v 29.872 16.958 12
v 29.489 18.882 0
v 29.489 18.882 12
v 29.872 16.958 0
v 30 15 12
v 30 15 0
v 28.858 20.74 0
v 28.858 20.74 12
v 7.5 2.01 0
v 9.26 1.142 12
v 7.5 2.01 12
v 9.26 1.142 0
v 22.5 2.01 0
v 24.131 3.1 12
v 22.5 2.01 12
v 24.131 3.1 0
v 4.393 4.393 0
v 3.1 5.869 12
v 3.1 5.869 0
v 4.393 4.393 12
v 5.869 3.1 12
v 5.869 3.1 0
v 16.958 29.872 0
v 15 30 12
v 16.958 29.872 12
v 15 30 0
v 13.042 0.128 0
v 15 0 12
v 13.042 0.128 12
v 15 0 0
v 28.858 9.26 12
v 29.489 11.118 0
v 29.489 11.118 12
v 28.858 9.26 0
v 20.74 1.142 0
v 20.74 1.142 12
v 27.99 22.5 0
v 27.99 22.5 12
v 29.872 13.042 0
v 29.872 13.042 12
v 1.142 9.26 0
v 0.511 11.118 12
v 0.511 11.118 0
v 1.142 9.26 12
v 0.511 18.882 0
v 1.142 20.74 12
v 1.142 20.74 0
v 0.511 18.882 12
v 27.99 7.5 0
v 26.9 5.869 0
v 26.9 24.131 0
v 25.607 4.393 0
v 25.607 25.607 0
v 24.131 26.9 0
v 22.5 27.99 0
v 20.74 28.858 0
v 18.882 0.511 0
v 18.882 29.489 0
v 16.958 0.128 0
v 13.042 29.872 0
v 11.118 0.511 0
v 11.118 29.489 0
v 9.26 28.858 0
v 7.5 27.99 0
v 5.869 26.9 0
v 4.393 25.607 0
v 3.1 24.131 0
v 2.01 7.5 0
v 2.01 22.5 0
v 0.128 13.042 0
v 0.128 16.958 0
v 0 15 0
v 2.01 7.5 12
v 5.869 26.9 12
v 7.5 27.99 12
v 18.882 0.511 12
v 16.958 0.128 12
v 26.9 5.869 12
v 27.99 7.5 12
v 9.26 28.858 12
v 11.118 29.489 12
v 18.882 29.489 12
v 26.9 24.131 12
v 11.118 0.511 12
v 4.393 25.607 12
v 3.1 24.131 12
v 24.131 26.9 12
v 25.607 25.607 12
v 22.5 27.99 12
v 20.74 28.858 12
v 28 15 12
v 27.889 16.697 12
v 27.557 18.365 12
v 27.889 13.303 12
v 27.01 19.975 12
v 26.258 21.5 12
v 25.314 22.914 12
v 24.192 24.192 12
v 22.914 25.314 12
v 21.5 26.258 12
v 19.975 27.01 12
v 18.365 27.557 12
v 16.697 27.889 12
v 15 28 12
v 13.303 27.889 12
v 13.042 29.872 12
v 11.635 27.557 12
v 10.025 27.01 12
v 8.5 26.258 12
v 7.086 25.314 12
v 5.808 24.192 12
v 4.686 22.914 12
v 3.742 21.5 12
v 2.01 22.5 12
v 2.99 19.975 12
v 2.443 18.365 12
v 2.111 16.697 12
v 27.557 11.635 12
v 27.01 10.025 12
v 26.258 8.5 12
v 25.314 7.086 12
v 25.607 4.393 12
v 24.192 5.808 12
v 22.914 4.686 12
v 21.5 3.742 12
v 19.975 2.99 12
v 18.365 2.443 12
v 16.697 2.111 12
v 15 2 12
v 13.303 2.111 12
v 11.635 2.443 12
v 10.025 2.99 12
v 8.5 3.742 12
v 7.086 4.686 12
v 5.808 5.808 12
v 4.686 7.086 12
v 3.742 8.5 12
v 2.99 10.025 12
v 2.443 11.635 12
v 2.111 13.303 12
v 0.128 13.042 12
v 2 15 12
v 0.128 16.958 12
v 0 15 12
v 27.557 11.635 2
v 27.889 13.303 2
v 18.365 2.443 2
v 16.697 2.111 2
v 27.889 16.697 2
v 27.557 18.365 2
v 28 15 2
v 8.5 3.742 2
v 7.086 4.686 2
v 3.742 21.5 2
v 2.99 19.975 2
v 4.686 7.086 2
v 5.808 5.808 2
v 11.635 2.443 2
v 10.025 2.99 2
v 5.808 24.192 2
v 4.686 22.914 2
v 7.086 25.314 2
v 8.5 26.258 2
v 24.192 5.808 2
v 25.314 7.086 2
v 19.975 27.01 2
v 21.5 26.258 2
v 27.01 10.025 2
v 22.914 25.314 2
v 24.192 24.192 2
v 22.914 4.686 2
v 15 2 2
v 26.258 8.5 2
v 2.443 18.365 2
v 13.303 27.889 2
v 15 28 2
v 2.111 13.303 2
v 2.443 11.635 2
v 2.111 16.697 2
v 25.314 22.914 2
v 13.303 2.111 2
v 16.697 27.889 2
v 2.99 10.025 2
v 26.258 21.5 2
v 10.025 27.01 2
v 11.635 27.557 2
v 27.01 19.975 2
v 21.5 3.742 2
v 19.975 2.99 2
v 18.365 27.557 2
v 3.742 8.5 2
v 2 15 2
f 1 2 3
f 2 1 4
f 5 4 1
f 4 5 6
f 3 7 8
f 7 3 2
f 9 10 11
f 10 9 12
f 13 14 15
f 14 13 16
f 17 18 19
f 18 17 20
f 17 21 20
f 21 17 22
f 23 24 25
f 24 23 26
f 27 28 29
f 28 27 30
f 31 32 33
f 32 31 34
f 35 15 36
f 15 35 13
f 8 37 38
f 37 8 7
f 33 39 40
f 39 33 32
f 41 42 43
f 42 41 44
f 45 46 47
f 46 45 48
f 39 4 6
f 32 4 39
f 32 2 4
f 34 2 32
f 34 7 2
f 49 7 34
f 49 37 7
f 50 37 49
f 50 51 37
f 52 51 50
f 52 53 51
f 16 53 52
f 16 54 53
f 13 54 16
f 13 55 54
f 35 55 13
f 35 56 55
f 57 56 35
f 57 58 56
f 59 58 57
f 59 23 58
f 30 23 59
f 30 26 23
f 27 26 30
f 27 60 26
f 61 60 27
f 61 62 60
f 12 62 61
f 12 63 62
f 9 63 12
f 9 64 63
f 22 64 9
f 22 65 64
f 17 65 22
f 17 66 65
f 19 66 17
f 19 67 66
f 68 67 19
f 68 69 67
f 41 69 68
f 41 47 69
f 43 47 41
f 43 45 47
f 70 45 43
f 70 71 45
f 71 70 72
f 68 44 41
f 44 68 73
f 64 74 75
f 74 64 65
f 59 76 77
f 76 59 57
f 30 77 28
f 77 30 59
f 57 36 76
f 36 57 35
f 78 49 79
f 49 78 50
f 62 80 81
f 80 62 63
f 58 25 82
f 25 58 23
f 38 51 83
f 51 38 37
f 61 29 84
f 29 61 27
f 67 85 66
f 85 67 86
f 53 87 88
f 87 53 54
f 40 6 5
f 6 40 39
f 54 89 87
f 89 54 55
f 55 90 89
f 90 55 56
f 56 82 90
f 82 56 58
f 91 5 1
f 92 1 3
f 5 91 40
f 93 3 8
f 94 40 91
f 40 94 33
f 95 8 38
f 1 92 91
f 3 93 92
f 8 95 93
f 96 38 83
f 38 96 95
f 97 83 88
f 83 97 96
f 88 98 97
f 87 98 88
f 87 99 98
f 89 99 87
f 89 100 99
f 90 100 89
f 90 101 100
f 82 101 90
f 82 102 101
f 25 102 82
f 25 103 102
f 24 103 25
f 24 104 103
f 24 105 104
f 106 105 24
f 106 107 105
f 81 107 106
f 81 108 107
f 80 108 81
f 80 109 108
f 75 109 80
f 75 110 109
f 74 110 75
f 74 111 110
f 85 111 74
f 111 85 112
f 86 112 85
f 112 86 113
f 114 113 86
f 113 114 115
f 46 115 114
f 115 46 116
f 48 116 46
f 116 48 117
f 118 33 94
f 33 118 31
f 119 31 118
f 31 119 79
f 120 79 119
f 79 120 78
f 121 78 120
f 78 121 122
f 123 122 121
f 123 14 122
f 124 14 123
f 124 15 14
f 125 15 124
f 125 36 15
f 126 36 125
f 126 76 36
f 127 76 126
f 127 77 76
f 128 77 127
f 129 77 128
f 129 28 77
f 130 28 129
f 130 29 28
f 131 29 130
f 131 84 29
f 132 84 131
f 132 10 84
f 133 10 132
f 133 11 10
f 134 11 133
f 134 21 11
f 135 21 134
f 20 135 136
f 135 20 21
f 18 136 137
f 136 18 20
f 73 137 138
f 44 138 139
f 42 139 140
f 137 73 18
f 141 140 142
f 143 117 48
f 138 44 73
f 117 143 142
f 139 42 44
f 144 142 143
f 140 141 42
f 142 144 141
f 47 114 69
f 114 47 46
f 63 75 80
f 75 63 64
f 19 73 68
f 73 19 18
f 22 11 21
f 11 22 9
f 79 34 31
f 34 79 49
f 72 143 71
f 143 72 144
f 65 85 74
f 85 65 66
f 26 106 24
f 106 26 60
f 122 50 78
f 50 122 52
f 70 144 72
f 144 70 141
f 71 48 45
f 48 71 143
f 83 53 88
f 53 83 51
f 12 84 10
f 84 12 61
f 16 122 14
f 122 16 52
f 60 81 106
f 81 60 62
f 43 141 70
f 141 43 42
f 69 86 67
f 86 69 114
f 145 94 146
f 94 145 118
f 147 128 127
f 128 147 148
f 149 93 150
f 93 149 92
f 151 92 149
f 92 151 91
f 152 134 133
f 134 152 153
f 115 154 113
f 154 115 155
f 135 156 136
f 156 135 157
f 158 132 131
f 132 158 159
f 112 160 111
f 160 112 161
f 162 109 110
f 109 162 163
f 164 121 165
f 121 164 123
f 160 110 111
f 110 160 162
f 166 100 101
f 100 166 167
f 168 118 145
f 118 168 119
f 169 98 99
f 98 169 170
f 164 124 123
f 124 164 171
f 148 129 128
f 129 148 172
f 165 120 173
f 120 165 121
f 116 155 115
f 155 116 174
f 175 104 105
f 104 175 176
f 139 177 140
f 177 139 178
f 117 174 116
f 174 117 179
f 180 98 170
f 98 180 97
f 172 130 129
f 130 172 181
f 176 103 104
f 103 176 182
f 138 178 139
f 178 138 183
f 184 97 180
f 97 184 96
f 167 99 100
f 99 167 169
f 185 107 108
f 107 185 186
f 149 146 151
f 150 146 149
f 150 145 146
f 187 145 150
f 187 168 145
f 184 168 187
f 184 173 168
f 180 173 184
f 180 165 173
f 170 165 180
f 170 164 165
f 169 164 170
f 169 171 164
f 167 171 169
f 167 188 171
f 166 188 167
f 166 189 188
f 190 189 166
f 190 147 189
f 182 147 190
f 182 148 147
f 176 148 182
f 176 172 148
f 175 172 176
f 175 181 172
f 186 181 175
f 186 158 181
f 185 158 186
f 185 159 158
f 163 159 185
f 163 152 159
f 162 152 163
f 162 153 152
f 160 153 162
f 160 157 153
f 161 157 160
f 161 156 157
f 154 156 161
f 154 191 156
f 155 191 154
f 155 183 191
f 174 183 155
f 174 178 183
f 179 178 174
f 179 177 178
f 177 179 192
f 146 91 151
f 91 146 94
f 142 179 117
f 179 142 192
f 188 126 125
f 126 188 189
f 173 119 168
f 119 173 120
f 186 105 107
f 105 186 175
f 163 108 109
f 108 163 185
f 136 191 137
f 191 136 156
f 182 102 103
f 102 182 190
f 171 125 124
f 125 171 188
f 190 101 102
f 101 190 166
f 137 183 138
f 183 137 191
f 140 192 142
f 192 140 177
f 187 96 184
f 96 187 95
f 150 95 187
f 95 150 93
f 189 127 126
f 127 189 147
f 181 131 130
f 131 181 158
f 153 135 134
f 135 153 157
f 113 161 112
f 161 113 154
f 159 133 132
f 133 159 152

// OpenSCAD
// units=mm — generated by scad_emitter.py
// part=unnamed
$fn = 48;

difference() { translate([15, 15, 0]) cylinder(h=12, r=15, $fn=$fn); translate([15, 15, 2]) cylinder(h=10.5, r=13, $fn=$fn); }
